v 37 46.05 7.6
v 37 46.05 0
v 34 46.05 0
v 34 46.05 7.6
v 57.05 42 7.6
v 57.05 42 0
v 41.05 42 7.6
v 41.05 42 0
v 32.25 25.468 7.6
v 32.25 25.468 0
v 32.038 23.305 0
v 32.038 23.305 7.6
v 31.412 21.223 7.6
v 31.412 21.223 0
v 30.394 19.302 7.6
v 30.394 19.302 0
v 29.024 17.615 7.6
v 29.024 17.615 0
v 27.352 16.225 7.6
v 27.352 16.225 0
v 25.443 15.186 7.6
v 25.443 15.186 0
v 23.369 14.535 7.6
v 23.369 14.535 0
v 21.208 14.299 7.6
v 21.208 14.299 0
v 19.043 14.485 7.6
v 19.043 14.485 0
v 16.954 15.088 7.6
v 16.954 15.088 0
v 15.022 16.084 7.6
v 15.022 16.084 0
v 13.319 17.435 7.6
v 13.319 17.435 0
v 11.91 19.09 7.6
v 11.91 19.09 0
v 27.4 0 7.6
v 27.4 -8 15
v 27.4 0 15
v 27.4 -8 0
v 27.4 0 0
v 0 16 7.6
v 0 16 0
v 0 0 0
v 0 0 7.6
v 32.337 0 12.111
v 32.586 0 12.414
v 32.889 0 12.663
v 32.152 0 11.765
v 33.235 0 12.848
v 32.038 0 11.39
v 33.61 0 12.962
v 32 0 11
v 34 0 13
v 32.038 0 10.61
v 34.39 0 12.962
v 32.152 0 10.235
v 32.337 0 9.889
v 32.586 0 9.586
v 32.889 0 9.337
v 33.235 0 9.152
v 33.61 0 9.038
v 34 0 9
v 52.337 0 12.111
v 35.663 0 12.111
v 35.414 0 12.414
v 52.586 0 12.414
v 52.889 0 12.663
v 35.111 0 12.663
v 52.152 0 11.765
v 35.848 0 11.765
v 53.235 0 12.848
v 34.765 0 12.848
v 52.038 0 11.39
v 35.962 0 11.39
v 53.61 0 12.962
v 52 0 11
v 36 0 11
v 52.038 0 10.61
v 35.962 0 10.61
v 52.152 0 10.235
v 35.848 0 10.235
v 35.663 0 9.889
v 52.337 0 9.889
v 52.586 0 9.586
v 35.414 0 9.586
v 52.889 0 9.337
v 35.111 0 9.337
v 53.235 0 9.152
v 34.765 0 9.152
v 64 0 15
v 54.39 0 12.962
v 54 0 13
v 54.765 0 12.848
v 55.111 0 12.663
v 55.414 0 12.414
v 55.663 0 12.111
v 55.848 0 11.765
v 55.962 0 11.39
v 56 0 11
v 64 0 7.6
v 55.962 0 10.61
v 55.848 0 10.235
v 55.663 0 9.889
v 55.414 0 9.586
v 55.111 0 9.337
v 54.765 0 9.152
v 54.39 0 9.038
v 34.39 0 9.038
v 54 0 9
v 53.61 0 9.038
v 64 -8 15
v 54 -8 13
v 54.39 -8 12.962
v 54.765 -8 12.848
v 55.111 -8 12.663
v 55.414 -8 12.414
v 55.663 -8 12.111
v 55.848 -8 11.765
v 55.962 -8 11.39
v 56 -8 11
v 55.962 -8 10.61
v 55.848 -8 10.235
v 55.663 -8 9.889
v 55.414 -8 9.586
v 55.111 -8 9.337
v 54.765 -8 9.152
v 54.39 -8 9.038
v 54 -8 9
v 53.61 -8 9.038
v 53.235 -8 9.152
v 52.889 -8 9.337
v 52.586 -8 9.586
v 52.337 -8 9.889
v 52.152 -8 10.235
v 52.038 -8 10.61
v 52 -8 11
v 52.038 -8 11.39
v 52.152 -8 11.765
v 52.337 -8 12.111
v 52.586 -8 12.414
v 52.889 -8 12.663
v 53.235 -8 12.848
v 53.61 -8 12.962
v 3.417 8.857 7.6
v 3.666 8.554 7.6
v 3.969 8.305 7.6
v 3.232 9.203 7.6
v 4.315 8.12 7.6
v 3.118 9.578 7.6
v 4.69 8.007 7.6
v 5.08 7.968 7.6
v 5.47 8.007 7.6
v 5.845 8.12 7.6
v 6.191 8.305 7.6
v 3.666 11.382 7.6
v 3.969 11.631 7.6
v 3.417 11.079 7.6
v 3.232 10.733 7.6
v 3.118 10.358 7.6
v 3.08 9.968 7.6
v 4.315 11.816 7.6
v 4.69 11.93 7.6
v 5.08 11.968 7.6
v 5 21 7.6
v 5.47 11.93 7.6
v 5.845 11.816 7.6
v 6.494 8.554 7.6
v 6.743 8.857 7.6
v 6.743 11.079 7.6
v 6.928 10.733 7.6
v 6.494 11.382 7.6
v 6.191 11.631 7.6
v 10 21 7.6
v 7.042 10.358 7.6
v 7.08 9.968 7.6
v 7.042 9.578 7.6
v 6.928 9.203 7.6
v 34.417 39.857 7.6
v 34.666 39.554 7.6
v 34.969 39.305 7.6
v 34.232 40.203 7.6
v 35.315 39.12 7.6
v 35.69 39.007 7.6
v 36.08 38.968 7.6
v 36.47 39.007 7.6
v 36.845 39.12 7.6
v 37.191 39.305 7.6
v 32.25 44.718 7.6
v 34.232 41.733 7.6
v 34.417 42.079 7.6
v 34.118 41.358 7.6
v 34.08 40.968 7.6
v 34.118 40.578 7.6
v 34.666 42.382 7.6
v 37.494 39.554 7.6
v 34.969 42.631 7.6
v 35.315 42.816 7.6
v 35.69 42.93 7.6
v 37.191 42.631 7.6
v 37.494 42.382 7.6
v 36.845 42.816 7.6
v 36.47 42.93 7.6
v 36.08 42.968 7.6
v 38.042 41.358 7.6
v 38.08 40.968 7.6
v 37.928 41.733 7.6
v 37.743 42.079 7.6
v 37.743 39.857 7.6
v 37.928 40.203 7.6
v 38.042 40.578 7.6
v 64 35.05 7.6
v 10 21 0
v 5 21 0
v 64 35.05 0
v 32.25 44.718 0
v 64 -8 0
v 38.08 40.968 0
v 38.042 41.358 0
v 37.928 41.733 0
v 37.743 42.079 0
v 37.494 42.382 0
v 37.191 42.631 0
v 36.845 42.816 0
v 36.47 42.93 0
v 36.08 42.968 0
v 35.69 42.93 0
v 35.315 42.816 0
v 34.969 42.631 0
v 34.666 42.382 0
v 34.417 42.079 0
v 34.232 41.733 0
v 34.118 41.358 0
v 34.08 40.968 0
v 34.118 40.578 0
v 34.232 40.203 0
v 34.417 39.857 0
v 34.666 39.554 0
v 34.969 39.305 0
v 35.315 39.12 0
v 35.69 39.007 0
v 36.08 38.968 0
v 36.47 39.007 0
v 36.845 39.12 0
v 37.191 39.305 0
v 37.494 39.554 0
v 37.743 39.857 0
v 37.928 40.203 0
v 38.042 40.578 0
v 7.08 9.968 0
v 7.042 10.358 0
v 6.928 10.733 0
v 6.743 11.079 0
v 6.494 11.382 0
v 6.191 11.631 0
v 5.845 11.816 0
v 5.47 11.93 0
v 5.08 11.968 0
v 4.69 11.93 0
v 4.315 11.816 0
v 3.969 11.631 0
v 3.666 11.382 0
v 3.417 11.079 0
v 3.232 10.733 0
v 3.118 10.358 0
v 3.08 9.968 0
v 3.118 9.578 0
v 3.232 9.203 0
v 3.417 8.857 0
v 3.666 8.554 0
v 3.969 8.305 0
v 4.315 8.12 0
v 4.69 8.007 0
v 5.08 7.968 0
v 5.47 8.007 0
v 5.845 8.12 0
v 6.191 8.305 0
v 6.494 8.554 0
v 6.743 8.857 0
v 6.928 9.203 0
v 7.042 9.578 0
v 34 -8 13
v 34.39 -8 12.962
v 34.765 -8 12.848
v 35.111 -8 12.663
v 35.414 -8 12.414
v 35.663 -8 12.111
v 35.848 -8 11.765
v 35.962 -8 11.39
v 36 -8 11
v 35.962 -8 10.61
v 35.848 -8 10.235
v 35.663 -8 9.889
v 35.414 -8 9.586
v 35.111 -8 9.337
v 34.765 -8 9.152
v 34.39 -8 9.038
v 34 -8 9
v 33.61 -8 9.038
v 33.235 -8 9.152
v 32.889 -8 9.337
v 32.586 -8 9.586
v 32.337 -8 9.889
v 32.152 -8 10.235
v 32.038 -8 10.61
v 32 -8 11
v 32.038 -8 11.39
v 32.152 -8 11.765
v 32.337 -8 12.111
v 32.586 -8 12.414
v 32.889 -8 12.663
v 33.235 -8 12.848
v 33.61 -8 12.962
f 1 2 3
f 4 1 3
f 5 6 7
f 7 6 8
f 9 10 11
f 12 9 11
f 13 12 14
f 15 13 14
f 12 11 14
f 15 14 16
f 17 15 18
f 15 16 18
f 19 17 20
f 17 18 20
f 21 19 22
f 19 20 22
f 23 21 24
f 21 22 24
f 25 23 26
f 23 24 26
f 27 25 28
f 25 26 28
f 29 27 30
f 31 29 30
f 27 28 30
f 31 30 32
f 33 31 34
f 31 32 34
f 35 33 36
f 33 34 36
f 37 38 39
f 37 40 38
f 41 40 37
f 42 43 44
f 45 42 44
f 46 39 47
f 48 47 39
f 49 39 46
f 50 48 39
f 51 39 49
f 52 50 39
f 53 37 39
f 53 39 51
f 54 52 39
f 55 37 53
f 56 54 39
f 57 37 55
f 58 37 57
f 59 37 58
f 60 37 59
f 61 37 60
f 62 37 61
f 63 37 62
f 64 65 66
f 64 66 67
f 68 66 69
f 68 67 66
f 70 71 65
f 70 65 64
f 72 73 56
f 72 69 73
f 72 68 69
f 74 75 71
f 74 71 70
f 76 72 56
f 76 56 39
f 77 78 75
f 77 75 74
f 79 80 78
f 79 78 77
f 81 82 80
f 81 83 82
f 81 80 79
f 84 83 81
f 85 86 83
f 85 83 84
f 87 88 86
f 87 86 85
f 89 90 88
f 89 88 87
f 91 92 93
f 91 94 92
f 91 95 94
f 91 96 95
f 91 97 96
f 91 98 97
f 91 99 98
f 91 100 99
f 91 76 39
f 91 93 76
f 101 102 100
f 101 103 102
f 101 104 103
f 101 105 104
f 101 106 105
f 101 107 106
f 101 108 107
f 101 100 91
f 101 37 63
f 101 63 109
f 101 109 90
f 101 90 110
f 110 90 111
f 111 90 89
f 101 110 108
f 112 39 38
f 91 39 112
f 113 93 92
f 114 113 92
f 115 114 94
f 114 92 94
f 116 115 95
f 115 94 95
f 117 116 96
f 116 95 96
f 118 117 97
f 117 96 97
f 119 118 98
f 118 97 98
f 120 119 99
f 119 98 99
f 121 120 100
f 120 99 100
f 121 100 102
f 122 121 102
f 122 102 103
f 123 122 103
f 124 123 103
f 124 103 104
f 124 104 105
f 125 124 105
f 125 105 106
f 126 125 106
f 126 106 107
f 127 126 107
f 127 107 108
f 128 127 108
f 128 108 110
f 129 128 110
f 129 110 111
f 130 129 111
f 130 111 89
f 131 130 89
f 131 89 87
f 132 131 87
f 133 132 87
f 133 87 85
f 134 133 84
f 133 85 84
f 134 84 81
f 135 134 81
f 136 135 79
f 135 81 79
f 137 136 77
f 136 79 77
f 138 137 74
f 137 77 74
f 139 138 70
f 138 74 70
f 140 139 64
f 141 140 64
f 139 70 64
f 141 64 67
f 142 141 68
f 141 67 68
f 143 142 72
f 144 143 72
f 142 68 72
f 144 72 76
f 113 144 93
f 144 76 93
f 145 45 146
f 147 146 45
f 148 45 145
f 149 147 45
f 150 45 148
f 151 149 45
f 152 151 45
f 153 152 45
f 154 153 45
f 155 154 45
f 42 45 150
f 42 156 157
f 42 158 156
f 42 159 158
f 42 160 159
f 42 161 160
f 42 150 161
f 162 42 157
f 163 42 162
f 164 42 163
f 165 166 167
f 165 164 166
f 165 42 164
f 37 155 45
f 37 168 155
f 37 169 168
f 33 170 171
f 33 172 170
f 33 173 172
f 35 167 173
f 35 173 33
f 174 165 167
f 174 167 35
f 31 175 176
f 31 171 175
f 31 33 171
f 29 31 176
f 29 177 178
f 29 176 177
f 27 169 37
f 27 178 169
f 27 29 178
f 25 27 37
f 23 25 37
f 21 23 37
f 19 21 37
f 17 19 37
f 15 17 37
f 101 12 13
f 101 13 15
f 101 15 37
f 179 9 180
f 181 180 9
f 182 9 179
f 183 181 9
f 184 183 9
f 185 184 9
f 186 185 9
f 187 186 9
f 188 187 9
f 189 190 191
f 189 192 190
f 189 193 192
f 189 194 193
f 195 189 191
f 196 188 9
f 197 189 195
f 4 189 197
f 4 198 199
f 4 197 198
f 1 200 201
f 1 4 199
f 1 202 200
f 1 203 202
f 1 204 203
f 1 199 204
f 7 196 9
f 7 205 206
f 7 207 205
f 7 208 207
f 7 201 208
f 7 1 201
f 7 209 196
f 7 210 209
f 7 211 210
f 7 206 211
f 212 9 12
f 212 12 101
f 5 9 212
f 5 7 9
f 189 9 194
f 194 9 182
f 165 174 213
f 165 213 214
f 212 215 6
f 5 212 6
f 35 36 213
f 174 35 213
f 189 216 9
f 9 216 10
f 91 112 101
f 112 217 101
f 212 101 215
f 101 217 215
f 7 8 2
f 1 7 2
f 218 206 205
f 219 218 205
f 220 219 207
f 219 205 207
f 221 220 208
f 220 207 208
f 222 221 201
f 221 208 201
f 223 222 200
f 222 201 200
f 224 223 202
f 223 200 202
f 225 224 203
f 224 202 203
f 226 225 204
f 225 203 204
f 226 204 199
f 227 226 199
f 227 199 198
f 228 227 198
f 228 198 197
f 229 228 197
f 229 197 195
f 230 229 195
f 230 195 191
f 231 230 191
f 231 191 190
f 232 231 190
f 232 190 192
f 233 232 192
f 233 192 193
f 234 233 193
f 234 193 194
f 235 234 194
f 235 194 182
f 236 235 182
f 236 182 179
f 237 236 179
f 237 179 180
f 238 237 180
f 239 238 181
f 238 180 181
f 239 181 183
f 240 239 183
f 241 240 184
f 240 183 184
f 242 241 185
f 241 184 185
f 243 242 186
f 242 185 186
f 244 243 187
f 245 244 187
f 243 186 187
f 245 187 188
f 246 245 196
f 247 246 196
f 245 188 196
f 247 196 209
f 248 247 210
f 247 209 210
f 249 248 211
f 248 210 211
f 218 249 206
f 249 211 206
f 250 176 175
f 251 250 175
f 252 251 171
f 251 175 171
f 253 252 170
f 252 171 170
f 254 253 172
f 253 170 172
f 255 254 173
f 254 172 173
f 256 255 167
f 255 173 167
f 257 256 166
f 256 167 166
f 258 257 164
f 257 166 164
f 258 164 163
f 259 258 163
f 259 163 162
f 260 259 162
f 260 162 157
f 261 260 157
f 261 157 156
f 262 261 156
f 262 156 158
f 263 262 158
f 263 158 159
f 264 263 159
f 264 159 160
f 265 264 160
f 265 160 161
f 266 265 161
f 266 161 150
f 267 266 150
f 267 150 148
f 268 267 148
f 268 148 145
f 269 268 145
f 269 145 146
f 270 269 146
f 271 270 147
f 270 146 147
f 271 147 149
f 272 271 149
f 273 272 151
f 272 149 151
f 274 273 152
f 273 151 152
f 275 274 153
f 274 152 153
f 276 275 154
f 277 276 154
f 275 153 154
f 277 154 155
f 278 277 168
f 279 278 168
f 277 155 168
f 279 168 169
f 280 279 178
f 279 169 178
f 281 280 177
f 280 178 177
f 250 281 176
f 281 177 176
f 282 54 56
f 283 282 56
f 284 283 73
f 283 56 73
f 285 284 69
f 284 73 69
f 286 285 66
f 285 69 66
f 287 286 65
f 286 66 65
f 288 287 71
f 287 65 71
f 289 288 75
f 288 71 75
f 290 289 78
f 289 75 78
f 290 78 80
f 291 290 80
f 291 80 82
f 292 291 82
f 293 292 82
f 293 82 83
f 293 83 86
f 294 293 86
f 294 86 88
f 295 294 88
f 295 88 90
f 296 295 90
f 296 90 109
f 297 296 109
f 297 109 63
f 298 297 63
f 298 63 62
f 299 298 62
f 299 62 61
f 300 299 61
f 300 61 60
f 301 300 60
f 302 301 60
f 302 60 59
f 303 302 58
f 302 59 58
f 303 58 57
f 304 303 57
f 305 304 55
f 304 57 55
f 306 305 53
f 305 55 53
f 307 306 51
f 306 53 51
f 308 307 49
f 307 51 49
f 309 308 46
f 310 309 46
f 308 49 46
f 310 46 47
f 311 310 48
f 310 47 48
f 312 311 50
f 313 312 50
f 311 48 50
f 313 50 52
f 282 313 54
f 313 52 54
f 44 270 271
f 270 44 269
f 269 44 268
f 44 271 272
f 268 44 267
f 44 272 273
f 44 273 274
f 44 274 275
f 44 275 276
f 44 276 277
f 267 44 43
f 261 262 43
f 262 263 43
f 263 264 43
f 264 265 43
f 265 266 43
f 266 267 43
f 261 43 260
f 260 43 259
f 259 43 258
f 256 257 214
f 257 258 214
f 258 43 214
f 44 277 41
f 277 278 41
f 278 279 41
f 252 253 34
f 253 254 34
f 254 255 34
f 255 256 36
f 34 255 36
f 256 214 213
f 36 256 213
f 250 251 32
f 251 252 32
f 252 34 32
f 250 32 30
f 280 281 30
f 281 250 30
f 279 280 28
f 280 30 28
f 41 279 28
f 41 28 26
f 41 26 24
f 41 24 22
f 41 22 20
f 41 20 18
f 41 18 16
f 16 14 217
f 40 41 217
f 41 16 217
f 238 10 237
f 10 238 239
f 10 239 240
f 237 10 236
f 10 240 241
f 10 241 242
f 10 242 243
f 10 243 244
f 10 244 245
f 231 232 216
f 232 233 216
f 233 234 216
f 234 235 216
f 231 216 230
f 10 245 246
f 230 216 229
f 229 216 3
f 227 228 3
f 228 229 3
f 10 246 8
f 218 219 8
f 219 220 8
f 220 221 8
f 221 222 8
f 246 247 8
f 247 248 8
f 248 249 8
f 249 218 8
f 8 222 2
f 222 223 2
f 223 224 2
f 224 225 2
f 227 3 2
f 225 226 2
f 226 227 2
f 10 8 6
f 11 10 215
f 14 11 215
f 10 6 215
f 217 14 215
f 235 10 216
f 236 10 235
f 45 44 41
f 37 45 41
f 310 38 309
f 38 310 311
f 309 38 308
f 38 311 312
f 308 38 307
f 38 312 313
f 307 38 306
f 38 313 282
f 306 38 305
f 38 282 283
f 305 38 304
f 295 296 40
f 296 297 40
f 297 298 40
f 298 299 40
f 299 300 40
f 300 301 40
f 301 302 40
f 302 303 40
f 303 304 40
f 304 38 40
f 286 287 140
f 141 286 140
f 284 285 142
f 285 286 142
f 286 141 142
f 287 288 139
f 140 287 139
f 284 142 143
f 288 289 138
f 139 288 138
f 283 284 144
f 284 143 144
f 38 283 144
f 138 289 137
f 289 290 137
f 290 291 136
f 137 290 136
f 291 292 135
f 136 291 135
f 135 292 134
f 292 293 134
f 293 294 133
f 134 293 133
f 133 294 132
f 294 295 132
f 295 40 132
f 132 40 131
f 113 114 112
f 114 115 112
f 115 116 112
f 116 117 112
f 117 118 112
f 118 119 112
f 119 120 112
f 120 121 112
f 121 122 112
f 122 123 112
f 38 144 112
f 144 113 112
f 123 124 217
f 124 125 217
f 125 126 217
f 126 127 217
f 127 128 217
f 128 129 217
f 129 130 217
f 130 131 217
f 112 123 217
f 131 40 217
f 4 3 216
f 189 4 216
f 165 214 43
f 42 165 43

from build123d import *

# Parameters (mm, degrees)
BOSS_EXTRUDE1_DEPTH = 7.6
SKETCH2_W           = 36.6
SKETCH2_H           = 8
BOSS_EXTRUDE2_DEPTH = 7.4
SKETCH3_R           = 2
CUT_EXTRUDE1_DEPTH  = 81.259594442
SKETCH4_R           = 2
CUT_EXTRUDE2_DEPTH  = 80.210873622


with BuildPart() as part:
    # Sketch1 → Boss-Extrude1 (new body)
    with BuildSketch(Plane.XY):
        with BuildLine():
            Line((57.05, 42), (41.05, 42))
            Line((41.05, 42), (37, 46.05))
            Line((37, 46.05), (34, 46.05))
            Line((34, 46.05), (32.25, 44.718087488))
            Line((32.25, 44.718087488), (32.25, 25.468087488))
            ThreePointArc((32.25, 25.468087488), (24.422154993, 14.809809015), (11.91, 19.09))
            Line((11.91, 19.09), (10, 21))
            Line((10, 21), (5, 21))
            Line((5, 21), (0, 16))
            Line((0, 16), (0, 0))
            Line((0, 0), (27.4, 0))
            Line((27.4, 0), (27.4, -8))
            Line((27.4, -8), (64, -8))
            Line((64, -8), (64, 35.05))
            Line((64, 35.05), (57.05, 42))
        make_face()
    extrude(amount=BOSS_EXTRUDE1_DEPTH)

    # Sketch2 → Boss-Extrude2 (add)
    with BuildSketch(Plane.XY.offset(7.6)):
        with Locations((45.7, -4)):
            Rectangle(SKETCH2_W, SKETCH2_H)
    extrude(amount=BOSS_EXTRUDE2_DEPTH)

    # Sketch3 → Cut-Extrude1 (cut, through all)
    with BuildSketch(Plane(origin=(0, 0, 0), x_dir=(1, 0, 0), z_dir=(0, 1, 0))):
        with Locations(Location((54, -11, 0), (0, 0, 270))):
            Circle(SKETCH3_R)
        with Locations(Location((34, -11, 0), (0, 0, 270))):
            Circle(SKETCH3_R)
    extrude(amount=-CUT_EXTRUDE1_DEPTH, mode=Mode.SUBTRACT)

    # Sketch4 → Cut-Extrude2 (cut, through all)
    with BuildSketch(Plane.XY.offset(7.6)):
        with Locations((5.08, 9.968087488)):
            Circle(SKETCH4_R)
        with Locations((36.08, 40.968087488)):
            Circle(SKETCH4_R)
    extrude(amount=-CUT_EXTRUDE2_DEPTH, mode=Mode.SUBTRACT)


solid = part.part
